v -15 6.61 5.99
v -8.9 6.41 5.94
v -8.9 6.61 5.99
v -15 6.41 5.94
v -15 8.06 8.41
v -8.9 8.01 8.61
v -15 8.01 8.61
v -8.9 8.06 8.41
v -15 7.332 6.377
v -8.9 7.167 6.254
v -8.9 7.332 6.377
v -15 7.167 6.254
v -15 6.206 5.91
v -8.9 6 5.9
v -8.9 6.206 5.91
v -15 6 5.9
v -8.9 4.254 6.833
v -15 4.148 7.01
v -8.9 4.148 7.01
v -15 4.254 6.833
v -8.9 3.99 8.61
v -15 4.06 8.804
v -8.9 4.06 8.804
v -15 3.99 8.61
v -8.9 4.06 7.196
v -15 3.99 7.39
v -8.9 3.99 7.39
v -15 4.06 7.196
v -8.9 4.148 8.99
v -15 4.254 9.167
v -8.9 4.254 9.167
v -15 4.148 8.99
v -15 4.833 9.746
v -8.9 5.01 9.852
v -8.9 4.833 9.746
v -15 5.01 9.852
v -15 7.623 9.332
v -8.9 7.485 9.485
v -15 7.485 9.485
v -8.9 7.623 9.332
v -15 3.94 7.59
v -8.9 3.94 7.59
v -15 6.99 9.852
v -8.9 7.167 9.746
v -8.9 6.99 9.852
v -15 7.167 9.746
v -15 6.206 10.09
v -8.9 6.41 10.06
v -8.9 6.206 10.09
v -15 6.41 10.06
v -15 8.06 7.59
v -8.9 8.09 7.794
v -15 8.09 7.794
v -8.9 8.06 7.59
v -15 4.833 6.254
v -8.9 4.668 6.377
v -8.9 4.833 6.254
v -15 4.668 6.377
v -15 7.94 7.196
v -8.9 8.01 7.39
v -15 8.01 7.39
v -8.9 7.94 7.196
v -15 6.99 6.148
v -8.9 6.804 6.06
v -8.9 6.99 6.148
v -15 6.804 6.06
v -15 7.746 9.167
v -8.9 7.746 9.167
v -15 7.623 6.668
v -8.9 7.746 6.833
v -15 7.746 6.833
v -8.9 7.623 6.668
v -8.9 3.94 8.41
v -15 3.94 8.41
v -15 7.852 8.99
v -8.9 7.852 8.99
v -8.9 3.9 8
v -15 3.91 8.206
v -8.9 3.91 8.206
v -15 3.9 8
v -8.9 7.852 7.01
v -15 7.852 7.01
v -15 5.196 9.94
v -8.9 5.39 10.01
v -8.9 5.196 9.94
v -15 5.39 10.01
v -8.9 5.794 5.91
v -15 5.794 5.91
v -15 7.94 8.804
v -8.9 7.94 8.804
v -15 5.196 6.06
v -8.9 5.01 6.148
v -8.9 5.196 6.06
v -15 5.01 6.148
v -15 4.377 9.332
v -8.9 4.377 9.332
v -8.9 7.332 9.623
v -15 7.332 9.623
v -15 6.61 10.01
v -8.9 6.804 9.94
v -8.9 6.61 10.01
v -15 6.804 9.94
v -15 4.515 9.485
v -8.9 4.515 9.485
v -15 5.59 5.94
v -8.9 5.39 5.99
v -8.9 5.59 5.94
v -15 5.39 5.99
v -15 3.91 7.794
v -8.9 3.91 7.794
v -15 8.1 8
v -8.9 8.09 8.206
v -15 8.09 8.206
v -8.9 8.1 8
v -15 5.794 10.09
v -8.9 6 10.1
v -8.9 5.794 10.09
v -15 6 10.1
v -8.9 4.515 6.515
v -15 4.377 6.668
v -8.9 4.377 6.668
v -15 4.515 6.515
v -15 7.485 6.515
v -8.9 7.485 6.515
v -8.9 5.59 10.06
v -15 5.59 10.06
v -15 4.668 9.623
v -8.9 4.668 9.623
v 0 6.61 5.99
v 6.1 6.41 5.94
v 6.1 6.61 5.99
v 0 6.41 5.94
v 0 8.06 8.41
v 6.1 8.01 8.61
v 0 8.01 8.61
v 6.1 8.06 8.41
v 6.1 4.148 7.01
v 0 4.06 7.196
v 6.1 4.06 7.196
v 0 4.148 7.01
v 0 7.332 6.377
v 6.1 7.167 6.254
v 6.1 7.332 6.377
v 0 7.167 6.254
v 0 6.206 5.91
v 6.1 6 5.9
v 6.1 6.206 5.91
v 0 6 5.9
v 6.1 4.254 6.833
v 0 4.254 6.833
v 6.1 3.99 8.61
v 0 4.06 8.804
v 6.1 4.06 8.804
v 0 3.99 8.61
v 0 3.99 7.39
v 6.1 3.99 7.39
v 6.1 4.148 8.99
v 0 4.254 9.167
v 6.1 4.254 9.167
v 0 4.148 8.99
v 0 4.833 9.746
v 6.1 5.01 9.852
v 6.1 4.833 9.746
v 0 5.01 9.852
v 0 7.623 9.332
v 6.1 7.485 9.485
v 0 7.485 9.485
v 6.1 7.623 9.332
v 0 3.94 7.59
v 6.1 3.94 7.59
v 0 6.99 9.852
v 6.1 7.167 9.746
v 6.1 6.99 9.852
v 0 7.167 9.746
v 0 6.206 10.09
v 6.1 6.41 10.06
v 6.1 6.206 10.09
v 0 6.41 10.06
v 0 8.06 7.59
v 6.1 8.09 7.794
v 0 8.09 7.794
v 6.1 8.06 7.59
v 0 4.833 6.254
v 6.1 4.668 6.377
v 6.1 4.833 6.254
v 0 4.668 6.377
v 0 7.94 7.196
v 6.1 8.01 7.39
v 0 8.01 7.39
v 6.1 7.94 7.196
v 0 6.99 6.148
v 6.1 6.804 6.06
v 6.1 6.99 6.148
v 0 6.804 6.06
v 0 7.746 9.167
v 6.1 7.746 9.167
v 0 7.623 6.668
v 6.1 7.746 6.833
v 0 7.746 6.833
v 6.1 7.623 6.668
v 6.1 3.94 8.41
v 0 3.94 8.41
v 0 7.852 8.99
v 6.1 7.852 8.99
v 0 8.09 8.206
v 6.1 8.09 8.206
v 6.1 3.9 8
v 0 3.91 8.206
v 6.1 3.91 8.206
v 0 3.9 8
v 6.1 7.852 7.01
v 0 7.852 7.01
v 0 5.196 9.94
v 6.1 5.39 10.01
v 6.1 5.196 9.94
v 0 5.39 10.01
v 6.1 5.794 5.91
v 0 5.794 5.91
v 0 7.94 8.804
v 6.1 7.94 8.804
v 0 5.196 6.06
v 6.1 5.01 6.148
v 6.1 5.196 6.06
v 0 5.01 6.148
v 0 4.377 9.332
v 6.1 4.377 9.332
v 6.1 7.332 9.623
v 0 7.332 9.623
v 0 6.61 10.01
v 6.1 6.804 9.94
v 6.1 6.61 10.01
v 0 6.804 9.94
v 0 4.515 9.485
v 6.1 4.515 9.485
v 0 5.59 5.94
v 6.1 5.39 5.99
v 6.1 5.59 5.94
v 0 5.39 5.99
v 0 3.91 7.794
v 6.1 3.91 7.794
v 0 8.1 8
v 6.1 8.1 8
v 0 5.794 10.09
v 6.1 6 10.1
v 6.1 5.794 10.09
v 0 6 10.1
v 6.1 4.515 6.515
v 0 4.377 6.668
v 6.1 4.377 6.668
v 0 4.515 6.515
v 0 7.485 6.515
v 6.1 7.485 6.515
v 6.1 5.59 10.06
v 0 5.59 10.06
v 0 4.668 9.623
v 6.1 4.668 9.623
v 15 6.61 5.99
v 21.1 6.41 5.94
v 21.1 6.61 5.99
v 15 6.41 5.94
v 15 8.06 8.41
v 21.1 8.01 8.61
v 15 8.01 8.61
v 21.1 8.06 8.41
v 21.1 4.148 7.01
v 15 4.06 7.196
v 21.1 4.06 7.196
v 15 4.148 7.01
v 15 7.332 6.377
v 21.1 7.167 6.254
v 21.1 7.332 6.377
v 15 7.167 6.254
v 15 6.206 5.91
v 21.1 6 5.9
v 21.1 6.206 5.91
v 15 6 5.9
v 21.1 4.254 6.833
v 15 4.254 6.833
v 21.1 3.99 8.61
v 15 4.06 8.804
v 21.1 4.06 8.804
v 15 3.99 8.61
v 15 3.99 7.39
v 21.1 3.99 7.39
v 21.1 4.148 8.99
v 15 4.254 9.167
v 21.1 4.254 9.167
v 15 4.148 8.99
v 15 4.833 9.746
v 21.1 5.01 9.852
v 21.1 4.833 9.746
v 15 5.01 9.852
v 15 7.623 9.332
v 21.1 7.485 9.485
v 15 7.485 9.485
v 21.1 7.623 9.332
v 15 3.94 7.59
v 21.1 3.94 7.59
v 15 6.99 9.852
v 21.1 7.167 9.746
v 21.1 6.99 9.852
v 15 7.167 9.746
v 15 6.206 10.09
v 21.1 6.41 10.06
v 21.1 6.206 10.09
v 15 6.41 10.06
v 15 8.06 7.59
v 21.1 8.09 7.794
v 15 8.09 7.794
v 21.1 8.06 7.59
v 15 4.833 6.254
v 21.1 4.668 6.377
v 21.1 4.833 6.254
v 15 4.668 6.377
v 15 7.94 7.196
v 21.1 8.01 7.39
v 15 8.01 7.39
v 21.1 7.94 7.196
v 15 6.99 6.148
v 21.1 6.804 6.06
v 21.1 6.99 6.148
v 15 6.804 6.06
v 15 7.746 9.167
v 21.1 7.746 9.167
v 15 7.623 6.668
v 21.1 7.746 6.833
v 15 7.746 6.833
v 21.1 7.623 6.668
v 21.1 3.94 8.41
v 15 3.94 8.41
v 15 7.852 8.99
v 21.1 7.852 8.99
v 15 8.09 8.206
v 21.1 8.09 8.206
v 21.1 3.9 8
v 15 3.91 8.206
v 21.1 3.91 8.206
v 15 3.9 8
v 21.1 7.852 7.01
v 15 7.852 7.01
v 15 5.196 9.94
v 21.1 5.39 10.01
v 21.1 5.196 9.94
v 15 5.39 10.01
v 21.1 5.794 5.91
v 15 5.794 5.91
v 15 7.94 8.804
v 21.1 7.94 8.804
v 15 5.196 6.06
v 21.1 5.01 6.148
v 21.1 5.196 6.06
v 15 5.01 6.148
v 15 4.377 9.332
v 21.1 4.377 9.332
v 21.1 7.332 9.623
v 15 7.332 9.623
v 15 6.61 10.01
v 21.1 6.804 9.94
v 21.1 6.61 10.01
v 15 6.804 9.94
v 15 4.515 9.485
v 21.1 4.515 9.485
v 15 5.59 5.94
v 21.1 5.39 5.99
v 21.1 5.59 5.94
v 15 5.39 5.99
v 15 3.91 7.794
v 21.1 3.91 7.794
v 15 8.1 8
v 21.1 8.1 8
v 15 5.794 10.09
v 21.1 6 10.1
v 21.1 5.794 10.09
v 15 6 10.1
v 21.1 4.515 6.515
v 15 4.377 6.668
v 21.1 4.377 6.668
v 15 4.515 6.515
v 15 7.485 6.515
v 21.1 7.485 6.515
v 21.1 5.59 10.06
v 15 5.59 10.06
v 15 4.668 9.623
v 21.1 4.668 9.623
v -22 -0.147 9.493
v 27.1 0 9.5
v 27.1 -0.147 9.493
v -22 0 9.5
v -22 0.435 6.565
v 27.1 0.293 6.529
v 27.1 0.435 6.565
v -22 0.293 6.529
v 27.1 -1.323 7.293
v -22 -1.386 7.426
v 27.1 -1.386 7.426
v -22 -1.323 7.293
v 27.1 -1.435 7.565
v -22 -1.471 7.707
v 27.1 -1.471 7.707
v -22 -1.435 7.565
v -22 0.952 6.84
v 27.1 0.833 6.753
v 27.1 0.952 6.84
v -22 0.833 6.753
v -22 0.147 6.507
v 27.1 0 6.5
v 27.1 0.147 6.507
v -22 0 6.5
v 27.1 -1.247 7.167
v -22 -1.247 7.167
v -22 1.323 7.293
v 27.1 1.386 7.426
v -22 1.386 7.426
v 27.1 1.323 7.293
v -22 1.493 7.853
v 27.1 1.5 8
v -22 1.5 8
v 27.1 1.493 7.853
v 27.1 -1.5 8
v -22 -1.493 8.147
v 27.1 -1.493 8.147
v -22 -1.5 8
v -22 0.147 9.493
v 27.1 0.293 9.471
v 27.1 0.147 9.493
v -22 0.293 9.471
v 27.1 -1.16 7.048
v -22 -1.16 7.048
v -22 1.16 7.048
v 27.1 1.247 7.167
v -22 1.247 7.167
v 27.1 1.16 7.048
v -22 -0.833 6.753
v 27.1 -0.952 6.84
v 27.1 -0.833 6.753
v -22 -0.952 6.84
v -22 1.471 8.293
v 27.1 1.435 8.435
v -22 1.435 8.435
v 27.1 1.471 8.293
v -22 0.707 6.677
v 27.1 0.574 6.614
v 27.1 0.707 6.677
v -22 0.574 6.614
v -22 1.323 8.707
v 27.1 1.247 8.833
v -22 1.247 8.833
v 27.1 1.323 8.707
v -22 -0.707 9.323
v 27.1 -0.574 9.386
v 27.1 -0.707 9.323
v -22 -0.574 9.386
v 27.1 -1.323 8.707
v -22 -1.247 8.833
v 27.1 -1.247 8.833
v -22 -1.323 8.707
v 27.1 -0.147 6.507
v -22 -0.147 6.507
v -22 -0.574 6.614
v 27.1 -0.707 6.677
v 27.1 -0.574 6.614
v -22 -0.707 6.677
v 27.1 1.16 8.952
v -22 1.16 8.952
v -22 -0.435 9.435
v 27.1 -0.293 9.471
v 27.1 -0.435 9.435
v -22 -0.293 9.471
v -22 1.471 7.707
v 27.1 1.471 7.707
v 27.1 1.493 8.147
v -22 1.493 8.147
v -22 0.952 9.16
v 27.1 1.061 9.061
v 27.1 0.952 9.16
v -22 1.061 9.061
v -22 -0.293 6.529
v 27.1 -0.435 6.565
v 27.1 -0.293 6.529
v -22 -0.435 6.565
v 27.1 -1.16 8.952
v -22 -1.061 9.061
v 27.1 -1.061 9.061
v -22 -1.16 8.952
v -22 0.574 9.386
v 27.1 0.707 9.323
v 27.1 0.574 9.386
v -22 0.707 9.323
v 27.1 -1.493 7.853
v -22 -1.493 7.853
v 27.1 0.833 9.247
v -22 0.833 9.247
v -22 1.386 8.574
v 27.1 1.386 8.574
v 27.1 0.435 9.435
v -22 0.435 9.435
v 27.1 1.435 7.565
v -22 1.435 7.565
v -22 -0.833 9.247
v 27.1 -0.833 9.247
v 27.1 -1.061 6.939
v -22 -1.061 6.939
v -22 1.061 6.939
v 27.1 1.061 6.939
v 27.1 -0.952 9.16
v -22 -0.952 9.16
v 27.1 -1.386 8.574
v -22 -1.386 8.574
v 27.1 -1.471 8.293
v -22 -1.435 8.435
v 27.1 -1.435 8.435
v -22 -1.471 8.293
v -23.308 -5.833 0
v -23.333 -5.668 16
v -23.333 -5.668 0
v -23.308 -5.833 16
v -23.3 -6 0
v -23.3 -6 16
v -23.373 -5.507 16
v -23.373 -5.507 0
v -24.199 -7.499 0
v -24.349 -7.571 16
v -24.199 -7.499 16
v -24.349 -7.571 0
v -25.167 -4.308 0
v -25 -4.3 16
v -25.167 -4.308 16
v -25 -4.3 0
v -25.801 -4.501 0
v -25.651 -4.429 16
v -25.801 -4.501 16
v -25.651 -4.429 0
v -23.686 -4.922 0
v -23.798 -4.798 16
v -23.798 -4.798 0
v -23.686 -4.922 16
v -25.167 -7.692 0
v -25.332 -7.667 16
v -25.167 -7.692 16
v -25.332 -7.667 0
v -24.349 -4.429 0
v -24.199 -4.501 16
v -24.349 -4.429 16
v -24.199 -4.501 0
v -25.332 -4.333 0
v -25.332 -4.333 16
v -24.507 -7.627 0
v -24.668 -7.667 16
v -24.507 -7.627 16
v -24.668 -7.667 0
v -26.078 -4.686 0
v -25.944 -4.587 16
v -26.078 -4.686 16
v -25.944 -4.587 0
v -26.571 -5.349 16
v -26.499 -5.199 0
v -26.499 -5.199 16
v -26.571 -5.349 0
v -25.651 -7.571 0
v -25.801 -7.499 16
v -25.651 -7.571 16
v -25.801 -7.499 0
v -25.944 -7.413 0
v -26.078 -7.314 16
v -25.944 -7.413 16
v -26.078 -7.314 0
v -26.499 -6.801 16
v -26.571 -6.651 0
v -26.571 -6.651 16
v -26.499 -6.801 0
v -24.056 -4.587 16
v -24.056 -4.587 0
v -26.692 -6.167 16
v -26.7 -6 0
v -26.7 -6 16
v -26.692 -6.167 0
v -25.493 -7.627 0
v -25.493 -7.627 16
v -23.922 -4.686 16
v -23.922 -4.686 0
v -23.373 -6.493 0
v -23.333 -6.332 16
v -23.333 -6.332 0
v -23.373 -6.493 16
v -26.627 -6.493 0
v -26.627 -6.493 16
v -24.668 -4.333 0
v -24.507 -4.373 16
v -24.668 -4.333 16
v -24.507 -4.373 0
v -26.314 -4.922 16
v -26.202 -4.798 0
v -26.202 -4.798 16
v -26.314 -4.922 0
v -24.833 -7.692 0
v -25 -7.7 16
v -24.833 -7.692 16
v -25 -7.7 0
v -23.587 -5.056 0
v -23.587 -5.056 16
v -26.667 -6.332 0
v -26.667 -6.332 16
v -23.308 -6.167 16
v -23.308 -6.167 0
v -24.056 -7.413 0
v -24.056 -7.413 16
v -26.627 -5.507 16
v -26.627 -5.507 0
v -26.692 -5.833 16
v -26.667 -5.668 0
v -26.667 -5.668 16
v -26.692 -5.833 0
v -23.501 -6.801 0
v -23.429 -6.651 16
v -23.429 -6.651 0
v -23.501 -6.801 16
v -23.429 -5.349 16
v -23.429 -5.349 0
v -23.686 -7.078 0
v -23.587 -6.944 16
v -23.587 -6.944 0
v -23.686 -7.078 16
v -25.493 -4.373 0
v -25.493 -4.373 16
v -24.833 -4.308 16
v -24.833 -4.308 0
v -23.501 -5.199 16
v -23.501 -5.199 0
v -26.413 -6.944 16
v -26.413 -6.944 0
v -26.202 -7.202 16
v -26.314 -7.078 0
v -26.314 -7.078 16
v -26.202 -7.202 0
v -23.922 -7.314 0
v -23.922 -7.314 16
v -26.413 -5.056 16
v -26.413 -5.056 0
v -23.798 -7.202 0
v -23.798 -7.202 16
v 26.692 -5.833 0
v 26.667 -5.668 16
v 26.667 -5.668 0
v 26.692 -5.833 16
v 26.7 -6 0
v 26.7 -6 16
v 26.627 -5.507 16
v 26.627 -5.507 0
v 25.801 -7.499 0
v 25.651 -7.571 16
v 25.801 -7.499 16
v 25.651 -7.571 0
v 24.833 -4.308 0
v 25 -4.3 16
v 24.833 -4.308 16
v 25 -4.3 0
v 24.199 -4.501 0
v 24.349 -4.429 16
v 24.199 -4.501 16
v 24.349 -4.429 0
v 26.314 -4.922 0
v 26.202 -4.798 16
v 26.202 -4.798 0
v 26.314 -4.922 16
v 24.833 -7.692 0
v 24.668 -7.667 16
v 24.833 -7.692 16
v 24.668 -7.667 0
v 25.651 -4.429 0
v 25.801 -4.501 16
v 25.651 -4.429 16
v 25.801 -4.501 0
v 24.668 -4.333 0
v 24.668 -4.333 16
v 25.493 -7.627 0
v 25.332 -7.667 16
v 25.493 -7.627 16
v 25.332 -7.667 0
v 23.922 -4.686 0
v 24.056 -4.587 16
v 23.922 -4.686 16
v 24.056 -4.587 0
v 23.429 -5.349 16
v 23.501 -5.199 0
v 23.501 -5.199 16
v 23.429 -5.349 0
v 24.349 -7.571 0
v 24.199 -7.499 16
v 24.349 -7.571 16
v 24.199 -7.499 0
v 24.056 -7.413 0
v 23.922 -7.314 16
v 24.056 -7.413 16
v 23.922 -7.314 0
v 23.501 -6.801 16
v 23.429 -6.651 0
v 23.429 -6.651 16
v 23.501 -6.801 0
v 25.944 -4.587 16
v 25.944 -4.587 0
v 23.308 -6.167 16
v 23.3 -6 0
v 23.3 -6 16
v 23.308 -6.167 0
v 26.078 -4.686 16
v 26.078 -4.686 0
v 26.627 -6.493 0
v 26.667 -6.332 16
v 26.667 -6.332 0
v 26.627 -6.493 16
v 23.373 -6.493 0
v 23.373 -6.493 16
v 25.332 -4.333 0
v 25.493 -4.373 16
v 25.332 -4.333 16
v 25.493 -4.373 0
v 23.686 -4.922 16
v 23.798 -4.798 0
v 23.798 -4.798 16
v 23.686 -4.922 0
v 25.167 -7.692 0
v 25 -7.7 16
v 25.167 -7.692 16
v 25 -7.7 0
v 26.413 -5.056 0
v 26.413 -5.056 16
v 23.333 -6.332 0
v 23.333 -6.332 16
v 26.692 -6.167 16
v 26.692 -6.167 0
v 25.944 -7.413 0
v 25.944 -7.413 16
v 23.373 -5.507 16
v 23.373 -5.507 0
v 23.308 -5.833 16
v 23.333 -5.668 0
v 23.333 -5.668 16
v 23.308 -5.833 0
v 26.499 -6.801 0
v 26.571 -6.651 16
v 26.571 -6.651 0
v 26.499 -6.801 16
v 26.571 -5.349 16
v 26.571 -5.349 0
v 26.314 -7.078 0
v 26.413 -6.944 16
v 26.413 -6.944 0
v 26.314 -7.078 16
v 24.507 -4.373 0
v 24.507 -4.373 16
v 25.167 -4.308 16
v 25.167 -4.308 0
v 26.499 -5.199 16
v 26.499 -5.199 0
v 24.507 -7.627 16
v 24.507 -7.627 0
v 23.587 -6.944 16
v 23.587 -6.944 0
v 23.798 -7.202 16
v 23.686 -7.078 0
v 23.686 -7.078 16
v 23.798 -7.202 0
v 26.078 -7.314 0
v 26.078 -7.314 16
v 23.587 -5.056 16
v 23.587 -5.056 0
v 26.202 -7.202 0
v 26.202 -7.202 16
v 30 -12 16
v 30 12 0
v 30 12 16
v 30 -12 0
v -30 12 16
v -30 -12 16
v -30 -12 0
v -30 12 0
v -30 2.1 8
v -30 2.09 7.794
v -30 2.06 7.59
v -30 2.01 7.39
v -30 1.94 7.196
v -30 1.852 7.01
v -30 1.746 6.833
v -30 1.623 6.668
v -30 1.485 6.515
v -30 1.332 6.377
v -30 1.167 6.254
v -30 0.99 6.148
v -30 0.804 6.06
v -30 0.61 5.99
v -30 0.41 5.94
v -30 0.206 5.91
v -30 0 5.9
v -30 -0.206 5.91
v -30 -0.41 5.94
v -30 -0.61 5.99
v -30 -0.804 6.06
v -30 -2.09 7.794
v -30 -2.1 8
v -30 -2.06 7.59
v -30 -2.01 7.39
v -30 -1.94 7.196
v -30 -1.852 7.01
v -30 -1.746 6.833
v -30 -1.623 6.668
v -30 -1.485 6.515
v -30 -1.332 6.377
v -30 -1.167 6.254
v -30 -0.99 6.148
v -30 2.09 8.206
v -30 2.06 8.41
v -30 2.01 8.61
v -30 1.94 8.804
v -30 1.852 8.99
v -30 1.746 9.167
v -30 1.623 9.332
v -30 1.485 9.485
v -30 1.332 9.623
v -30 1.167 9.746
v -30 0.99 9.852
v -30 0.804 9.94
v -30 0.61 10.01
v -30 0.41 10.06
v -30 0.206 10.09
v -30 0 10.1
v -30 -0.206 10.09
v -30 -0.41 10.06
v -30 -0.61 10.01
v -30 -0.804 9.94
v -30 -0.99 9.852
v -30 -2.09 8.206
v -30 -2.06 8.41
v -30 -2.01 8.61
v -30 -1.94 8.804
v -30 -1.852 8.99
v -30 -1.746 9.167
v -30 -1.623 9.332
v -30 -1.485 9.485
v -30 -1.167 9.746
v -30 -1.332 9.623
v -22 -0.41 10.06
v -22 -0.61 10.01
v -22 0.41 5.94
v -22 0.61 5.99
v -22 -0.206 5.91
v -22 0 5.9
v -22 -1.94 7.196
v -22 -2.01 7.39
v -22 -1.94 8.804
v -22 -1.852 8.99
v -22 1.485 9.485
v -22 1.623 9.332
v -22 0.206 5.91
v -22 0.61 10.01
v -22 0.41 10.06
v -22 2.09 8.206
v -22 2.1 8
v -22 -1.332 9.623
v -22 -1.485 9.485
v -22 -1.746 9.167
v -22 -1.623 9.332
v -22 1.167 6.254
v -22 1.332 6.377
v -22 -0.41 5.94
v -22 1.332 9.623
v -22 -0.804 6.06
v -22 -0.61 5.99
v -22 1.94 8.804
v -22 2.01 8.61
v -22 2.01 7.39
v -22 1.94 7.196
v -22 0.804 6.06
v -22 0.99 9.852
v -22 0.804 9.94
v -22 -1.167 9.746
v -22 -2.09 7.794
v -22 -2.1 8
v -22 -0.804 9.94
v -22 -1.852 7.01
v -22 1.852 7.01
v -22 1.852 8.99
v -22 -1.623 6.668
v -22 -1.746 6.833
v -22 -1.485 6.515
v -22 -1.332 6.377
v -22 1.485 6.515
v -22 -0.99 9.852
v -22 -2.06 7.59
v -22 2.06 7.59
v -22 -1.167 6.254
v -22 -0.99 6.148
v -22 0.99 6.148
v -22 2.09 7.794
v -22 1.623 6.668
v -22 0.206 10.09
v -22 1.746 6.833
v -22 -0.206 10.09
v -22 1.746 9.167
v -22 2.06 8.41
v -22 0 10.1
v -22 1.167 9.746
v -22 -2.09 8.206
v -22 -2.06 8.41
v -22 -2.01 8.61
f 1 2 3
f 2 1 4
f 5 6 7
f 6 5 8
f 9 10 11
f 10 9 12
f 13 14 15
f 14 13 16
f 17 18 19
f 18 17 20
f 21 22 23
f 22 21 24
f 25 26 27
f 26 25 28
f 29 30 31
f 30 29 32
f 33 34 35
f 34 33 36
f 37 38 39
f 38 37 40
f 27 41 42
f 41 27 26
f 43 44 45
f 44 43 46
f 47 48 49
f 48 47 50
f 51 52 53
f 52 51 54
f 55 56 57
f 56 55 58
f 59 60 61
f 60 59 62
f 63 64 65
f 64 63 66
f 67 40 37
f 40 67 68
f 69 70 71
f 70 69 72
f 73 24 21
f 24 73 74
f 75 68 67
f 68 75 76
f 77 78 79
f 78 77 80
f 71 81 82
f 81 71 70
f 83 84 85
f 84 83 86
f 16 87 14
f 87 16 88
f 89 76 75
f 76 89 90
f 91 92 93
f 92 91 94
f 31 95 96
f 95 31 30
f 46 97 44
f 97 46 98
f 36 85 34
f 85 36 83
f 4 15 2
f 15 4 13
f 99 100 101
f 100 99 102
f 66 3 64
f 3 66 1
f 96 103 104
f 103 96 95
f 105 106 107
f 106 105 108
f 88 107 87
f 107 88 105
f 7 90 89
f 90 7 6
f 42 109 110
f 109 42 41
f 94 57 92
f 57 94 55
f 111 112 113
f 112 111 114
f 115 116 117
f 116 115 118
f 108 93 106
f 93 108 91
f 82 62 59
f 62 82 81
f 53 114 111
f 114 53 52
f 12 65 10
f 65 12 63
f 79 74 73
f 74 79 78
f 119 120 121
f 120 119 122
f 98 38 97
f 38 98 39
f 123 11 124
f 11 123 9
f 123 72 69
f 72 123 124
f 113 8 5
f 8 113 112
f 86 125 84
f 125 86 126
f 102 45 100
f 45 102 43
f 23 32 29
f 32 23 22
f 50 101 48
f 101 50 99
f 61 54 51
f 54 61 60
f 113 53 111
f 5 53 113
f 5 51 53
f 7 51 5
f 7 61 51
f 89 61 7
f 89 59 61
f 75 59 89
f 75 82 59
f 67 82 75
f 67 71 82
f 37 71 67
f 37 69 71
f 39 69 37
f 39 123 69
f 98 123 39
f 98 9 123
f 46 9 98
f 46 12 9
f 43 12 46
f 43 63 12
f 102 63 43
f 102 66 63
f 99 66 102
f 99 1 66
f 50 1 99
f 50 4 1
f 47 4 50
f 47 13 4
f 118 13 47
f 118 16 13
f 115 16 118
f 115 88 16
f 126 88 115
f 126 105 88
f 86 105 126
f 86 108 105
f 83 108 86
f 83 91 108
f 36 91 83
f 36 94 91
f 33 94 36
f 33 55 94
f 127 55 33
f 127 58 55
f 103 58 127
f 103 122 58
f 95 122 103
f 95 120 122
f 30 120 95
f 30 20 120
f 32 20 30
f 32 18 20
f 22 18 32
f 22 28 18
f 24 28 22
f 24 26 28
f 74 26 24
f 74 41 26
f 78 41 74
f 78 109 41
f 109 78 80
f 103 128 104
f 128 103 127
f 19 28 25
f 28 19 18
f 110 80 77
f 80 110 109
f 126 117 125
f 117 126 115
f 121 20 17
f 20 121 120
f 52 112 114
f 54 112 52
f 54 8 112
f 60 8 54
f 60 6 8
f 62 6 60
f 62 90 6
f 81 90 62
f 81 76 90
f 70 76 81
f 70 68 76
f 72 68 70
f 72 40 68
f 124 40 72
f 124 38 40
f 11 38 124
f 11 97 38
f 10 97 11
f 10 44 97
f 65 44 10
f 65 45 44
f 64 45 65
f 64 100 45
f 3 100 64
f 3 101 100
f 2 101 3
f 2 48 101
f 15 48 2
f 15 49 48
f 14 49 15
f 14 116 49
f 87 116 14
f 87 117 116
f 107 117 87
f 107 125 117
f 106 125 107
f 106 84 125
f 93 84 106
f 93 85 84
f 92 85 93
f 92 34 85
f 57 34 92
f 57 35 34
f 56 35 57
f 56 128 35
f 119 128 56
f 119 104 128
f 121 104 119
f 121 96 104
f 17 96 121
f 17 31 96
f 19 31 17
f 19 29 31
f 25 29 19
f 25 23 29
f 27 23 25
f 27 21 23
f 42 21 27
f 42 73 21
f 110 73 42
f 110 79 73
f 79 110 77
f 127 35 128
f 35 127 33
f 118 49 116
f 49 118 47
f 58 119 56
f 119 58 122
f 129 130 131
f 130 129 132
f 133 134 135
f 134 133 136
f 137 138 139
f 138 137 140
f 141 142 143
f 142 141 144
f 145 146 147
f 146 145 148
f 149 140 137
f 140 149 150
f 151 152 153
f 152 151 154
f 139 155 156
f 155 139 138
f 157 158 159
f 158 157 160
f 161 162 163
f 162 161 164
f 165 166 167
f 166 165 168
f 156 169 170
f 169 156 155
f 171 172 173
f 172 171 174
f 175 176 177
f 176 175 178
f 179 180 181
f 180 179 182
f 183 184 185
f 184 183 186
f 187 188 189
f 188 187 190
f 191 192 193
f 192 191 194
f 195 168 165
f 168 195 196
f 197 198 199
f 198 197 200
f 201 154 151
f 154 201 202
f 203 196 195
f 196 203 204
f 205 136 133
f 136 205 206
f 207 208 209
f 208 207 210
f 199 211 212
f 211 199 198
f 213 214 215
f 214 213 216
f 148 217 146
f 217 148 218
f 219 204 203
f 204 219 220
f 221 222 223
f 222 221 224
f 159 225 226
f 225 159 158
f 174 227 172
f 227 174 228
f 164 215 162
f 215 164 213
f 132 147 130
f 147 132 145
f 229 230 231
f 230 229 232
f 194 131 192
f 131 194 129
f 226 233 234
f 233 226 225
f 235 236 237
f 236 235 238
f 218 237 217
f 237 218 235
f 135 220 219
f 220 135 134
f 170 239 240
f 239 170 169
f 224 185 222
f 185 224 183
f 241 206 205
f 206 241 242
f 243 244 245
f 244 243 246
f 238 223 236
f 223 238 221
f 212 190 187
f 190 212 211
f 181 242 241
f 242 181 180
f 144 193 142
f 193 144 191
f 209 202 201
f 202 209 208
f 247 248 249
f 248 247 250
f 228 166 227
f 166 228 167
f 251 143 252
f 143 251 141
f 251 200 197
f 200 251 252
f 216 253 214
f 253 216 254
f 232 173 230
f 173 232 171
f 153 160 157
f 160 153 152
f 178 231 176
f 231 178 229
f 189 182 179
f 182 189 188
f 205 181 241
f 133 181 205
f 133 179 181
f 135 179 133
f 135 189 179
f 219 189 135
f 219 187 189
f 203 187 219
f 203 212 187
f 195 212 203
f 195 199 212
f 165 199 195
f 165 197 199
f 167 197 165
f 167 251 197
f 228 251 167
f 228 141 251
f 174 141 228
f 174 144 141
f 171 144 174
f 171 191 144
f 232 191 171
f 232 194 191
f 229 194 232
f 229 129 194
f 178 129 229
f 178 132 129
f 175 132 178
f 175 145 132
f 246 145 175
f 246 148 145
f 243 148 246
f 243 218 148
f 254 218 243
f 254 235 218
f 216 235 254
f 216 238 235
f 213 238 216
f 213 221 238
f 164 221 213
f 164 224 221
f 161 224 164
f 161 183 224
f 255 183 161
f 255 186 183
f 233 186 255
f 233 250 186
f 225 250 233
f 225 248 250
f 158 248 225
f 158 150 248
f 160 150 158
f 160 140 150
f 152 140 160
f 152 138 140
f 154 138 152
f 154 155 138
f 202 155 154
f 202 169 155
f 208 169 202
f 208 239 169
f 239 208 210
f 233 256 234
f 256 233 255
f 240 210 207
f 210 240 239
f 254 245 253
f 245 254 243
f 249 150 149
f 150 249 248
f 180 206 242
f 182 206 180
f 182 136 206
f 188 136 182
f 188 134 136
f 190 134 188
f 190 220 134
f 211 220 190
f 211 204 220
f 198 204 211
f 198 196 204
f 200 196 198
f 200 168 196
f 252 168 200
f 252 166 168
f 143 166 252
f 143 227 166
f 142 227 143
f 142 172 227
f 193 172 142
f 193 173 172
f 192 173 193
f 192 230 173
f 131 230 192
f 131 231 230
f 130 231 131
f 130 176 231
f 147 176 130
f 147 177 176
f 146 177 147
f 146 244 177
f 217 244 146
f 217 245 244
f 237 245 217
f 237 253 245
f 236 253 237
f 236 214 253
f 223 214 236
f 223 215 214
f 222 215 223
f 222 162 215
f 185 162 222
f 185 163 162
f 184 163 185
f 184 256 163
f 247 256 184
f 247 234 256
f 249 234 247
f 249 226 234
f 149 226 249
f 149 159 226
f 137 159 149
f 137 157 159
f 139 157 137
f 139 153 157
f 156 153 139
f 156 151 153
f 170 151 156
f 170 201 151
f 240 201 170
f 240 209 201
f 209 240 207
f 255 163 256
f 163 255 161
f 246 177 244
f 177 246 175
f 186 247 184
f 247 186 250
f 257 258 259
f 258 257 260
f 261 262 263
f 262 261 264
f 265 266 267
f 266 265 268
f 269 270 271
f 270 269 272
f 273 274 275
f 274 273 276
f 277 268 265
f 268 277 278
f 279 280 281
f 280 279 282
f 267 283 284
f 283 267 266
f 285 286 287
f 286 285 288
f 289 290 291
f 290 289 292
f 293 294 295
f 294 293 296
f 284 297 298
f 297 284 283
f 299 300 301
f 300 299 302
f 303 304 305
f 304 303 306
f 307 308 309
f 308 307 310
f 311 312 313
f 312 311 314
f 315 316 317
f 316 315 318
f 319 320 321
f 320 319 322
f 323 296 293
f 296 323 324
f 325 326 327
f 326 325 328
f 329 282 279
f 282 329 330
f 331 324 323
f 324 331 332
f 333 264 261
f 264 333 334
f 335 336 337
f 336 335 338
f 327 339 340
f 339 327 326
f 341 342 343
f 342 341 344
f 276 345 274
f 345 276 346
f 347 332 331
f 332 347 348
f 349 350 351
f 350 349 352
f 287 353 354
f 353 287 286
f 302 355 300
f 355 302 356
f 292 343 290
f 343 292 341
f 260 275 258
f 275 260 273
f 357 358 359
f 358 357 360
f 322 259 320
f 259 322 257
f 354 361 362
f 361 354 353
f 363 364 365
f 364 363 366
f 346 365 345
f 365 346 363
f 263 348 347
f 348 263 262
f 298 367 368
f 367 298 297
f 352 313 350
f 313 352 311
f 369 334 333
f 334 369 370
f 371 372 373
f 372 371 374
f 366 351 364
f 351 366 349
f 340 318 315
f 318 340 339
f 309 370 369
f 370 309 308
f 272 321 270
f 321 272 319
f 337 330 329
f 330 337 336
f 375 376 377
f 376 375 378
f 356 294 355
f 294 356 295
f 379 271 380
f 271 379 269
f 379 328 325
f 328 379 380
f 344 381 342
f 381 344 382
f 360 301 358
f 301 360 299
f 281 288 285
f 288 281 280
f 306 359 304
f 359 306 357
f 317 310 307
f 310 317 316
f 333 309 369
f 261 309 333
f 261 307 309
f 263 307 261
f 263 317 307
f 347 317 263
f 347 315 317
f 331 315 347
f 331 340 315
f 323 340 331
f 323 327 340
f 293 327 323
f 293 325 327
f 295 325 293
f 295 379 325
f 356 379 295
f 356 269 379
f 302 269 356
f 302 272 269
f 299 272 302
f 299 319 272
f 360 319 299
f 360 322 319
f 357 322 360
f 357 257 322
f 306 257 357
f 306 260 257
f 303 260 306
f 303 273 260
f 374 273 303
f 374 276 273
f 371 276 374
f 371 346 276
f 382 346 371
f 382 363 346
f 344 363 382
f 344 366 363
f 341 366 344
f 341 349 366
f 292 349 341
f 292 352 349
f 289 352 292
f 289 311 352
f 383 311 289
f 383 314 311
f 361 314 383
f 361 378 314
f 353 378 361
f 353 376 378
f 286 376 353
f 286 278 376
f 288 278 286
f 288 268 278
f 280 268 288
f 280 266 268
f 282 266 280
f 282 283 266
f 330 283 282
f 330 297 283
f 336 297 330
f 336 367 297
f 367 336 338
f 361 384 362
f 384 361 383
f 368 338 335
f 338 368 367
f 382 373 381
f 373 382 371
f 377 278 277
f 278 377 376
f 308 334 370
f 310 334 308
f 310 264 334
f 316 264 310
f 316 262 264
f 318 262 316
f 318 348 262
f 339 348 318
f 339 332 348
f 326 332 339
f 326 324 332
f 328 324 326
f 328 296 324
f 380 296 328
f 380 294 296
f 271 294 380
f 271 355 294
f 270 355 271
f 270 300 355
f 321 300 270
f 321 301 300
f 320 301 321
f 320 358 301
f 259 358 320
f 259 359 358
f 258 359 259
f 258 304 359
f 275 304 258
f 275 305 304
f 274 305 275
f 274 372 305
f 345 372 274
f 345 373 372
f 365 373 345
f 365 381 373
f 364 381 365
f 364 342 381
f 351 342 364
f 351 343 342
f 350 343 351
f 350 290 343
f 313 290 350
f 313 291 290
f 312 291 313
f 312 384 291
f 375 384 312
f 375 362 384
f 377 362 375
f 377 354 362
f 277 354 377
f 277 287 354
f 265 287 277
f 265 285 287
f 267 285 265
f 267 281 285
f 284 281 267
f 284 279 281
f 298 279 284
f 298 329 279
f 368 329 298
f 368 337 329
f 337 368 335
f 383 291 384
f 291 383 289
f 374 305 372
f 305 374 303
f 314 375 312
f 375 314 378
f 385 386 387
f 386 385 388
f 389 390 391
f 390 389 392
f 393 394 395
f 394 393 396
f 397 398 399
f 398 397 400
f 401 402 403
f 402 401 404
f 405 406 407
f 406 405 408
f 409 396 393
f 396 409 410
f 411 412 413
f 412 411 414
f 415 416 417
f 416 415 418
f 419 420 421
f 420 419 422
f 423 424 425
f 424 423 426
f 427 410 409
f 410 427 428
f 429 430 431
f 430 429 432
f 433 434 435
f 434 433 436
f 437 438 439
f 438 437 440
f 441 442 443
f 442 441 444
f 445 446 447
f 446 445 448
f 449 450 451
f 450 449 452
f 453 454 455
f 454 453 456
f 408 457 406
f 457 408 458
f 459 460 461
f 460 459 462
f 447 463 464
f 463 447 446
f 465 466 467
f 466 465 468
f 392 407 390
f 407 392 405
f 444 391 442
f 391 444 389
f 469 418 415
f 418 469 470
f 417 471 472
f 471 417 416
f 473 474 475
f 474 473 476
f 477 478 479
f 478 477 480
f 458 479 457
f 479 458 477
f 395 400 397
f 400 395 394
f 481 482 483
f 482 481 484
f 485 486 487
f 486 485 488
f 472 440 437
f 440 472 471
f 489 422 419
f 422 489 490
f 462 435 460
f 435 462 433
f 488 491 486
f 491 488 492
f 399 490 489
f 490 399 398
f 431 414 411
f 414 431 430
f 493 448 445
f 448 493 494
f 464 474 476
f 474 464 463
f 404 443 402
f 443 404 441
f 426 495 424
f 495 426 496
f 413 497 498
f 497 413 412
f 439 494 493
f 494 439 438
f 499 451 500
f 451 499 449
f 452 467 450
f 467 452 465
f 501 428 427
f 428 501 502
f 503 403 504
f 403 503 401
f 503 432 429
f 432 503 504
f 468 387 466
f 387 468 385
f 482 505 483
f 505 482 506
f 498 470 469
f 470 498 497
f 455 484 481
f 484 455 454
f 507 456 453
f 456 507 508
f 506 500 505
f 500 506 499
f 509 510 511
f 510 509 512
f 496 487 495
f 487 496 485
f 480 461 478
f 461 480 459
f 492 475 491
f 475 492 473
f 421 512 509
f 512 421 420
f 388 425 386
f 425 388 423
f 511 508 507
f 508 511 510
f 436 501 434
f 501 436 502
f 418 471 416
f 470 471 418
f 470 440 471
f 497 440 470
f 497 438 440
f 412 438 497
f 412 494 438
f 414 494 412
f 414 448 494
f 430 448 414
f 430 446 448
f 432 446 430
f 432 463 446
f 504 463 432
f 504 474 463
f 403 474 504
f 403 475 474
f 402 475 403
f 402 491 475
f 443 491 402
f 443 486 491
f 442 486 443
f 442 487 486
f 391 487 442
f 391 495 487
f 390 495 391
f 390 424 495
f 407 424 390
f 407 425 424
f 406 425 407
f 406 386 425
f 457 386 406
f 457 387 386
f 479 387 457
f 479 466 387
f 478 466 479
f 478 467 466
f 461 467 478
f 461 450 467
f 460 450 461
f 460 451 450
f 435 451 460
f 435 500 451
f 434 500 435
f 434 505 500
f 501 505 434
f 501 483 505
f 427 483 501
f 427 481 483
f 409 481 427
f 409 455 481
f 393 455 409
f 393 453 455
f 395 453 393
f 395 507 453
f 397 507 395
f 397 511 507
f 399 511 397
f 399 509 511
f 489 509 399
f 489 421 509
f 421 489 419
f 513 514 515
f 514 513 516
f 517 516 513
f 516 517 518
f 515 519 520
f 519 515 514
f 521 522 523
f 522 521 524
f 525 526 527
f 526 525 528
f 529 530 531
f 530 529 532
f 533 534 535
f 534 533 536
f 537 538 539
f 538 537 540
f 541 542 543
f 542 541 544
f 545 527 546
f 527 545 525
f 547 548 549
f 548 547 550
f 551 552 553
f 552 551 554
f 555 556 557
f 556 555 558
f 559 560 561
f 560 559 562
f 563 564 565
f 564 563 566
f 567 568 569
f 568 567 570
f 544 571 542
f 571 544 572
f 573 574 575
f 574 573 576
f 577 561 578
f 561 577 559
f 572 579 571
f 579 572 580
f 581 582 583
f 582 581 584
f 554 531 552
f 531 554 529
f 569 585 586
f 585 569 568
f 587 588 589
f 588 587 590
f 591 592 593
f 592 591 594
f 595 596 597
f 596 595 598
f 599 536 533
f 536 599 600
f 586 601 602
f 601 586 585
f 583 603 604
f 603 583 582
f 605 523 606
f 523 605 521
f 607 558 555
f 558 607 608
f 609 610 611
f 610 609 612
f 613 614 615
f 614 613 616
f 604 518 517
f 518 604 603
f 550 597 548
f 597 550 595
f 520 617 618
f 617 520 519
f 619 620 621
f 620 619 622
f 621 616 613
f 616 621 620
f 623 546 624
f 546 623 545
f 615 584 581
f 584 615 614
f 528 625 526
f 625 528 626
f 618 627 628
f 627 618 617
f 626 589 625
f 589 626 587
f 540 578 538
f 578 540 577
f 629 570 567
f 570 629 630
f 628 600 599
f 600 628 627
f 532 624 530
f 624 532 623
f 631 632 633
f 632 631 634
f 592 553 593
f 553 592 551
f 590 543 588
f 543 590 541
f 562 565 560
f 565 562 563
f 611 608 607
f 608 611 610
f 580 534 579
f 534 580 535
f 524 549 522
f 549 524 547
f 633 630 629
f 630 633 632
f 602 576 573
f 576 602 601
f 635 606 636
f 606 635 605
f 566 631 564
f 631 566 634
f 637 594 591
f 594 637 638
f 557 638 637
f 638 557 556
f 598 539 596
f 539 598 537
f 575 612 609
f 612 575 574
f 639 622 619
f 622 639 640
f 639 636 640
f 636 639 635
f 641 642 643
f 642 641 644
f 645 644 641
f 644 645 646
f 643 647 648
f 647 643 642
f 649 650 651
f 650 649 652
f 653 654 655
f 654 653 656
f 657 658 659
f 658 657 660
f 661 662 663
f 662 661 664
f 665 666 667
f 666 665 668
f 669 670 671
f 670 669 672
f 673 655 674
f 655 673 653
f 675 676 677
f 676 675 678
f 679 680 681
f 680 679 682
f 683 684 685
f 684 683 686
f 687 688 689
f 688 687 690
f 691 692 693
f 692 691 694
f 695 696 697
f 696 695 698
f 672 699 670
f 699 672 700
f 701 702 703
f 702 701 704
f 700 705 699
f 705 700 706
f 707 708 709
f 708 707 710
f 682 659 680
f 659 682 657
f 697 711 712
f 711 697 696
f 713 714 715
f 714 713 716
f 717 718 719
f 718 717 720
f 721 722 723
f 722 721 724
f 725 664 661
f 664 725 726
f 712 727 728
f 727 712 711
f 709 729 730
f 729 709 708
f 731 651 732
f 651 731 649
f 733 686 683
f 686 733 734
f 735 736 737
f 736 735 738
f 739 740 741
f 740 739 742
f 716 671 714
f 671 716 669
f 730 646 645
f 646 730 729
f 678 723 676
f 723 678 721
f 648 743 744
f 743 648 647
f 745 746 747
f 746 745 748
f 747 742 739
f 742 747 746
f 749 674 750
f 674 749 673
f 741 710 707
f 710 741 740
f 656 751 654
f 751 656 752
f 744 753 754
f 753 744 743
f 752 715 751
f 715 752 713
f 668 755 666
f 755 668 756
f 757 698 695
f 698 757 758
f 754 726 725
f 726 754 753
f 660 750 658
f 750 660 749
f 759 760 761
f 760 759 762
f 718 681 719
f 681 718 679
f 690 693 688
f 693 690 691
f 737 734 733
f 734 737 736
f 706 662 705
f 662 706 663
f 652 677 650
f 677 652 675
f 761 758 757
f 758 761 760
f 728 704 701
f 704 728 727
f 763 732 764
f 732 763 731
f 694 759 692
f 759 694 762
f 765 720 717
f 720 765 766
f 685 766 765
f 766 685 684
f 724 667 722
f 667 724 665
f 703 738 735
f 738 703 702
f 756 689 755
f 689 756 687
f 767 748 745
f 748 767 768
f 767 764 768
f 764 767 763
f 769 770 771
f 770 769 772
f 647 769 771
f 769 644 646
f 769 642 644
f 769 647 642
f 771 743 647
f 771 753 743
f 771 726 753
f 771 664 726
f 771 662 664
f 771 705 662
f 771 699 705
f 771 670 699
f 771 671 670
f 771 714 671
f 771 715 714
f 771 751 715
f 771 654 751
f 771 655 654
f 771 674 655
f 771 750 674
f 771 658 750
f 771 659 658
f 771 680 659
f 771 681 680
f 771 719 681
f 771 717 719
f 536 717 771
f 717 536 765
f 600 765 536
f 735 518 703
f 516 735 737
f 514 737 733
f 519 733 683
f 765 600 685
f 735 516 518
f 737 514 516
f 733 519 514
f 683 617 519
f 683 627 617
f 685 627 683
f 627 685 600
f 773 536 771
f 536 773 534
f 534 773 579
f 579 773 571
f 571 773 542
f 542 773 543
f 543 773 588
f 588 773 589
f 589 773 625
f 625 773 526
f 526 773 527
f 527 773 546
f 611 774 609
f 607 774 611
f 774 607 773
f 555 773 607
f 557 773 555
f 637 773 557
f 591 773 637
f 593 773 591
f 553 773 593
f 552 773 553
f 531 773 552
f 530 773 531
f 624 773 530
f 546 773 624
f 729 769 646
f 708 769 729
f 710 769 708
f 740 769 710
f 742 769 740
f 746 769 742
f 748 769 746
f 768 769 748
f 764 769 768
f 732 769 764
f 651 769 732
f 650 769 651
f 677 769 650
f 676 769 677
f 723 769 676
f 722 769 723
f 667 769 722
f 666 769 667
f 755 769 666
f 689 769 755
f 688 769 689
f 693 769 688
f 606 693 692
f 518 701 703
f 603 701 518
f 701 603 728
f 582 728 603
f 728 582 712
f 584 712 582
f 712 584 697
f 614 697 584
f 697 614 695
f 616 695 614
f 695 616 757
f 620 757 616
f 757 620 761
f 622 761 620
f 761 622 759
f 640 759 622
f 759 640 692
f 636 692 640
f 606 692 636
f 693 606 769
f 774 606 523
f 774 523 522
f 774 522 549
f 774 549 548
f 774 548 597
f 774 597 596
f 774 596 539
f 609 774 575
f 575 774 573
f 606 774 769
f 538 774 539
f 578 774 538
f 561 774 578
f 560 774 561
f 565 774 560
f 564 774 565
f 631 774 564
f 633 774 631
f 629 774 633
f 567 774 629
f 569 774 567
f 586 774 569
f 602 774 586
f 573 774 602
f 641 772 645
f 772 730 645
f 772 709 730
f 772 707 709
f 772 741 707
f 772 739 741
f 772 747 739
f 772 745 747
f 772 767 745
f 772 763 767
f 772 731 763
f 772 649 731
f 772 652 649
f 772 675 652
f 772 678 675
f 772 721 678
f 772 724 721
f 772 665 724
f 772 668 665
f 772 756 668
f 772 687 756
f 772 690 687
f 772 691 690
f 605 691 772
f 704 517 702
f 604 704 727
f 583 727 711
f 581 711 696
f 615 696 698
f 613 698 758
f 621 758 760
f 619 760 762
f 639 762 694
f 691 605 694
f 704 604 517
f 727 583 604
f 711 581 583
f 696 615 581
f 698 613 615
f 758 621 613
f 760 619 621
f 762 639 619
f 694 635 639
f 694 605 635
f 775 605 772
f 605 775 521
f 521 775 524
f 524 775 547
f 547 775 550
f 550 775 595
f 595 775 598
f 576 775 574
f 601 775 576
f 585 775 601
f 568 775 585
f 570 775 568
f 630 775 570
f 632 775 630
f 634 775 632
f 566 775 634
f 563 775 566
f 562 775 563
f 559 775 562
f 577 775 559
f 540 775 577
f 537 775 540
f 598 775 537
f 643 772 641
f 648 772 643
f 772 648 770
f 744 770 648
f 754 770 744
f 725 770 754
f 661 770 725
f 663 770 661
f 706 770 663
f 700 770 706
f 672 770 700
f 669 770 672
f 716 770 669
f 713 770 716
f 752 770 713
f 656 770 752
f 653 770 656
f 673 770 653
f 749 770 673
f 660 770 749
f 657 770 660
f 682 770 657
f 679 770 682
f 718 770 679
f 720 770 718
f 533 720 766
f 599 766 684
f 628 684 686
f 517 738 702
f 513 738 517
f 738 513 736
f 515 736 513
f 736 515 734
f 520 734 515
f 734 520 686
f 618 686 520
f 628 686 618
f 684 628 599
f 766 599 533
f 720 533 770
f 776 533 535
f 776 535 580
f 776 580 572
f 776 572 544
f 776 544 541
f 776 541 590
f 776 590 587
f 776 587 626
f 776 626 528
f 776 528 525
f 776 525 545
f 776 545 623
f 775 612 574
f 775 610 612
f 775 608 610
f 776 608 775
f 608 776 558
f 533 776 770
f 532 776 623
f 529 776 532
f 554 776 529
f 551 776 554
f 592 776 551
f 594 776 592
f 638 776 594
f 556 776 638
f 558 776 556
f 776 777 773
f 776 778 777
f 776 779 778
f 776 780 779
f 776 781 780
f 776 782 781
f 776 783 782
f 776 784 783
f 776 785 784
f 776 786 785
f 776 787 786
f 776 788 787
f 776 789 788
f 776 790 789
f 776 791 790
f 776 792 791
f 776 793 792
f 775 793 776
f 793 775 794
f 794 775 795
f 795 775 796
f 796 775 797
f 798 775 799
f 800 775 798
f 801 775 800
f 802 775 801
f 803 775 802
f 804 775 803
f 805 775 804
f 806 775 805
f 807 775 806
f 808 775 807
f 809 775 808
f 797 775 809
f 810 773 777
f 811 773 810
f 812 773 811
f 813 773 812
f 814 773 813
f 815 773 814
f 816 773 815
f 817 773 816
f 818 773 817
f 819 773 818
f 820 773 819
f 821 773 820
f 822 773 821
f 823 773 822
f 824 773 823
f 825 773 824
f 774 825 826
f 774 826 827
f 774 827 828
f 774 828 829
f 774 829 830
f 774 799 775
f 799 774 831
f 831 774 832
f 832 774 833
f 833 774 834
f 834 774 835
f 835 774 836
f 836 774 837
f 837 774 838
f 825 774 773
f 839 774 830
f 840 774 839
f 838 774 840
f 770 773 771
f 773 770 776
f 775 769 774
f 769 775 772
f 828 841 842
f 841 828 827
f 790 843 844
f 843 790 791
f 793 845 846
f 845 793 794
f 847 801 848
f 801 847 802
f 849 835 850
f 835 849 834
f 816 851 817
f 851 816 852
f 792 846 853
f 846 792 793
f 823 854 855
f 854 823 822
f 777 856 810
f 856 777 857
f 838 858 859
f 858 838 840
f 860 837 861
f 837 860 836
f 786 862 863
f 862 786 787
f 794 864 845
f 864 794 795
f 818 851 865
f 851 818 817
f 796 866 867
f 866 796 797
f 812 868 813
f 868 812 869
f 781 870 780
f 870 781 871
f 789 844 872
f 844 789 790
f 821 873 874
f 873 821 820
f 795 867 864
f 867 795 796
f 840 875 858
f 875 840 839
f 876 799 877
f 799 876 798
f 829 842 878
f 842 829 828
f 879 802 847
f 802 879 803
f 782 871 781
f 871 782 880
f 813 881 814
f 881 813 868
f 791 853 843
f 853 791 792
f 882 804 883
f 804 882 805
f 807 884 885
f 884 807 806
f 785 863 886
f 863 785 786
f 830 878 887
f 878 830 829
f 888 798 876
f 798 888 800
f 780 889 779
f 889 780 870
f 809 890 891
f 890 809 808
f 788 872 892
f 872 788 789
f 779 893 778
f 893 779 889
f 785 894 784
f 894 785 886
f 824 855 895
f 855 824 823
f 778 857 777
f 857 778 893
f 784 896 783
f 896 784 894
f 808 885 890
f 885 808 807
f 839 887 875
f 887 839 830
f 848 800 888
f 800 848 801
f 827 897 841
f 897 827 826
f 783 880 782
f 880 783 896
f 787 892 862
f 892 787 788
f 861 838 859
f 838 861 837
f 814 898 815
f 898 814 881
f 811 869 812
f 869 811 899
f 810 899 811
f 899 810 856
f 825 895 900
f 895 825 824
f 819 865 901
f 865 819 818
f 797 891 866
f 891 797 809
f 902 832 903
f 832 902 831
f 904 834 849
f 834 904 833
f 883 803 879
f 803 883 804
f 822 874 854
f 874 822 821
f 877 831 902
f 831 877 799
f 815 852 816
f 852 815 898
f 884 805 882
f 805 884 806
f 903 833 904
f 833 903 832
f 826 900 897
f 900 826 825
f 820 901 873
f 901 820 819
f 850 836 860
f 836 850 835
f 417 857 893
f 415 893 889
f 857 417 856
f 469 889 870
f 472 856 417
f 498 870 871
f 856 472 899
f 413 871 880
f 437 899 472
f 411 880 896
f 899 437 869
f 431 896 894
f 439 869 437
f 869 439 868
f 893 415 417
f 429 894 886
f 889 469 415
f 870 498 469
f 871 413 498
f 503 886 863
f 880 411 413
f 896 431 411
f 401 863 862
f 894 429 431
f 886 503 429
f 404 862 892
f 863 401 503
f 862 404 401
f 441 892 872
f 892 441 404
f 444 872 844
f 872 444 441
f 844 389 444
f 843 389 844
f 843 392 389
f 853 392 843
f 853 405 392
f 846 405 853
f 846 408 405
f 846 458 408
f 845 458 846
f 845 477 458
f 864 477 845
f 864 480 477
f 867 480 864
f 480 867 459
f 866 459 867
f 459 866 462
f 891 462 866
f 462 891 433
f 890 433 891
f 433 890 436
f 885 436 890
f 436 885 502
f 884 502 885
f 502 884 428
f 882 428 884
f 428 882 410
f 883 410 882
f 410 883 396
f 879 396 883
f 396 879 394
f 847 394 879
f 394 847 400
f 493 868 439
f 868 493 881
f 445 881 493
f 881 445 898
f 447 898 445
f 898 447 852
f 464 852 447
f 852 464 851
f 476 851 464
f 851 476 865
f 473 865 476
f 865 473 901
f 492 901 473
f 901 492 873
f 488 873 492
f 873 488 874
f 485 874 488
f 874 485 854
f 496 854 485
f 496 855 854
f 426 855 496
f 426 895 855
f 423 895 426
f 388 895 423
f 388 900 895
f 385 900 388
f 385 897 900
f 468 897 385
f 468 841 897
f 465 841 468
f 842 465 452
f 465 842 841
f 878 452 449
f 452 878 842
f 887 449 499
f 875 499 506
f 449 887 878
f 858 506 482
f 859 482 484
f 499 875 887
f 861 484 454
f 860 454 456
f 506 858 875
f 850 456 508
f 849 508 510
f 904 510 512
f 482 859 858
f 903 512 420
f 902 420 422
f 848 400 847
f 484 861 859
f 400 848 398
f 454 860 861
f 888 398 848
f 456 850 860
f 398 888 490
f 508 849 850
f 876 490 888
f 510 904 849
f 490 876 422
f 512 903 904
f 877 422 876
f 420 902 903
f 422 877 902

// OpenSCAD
// --- Dimensions (mm) ---
block_x = 60;           // Total length of block
block_y = 24;           // Total width of block
block_z = 16;           // Total height of block

channel_dia = 3.0;      // Diameter of internal channels
socket_dia = 4.2;       // Diameter of tubing sockets
socket_depth_in = 8.0;  // Depth of inlet socket
socket_depth_out = 6.0; // Depth of outlet sockets

inlet_x_pos = -30;       // Center of -X face (60/2)
inlet_y_pos = 0;         // Offset from center Y
inlet_z_pos = 8;         // Mid-plane Z

outlet_x_coords = [-15, 0, 15]; // X positions of the three outlets
outlet_z_pos = 8;        // Mid-plane Z

screw_hole_dia = 3.4;    // Diameter for M3 screws
screw_x_coords = [-25, 25]; // X positions of screw holes
screw_y_pos = -6;        // Y position of screw holes

// --- Parameters ---
$fn = 64;

// --- Main Block ---
difference() {
    // The solid block
    translate([-block_x/2, -block_y/2, 0])
        cube([block_x, block_y, block_z]);

    // 1. Inlet Socket (-X face, Y=0)
    // Positioned at the -X face (x = -30)
    translate([-block_x/2 - 0.1, inlet_y_pos, inlet_z_pos])
        rotate([0, 90, 0])
            cylinder(h = socket_depth_in + 0.1, d = socket_dia);

    // 2. Main Channel (Inlet to x=15)
    // Starts at the inlet face and runs to x = 15.
    // The inlet is at x = -30. The channel length is 45mm.
    translate([-block_x/2, inlet_y_pos, inlet_z_pos])
        rotate([0, 90, 0])
            cylinder(h = 45 + 0.1, d = channel_dia);

    // 3. Outlet Sockets (+Y face)
    // Three outlets at x = -15, 0, 15 running in +Y direction
    // They end at the +Y face (y = 12)
    for (x_pos = outlet_x_coords) {
        translate([x_pos, block_y/2 - socket_depth_out, outlet_z_pos])
            rotate([0, 90, 0])
                cylinder(h = socket_depth_out + 0.1, d = socket_dia);
    }

    // 4. Outlet Channels (Connecting main channel to outlet sockets)
    // The main channel is at y=0. The outlet sockets are at y=12.
    // The channels must bridge the gap from y=0 to the start of the sockets.
    for (x_pos = outlet_x_coords) {
        translate([x_pos, 0, outlet_z_pos])
            rotate([0, 90, 0])
                cylinder(h = block_y/2 + 0.1, d = channel_dia);
    }

    // 5. Screw Holes (Vertical through-holes)
    // Through the block at x = -25 and 25, y = -6
    for (x_pos = screw_x_coords) {
        translate([x_pos, screw_y_pos, -0.1])
            cylinder(h = block_z + 0.2, d = screw_hole_dia);
    }
}
